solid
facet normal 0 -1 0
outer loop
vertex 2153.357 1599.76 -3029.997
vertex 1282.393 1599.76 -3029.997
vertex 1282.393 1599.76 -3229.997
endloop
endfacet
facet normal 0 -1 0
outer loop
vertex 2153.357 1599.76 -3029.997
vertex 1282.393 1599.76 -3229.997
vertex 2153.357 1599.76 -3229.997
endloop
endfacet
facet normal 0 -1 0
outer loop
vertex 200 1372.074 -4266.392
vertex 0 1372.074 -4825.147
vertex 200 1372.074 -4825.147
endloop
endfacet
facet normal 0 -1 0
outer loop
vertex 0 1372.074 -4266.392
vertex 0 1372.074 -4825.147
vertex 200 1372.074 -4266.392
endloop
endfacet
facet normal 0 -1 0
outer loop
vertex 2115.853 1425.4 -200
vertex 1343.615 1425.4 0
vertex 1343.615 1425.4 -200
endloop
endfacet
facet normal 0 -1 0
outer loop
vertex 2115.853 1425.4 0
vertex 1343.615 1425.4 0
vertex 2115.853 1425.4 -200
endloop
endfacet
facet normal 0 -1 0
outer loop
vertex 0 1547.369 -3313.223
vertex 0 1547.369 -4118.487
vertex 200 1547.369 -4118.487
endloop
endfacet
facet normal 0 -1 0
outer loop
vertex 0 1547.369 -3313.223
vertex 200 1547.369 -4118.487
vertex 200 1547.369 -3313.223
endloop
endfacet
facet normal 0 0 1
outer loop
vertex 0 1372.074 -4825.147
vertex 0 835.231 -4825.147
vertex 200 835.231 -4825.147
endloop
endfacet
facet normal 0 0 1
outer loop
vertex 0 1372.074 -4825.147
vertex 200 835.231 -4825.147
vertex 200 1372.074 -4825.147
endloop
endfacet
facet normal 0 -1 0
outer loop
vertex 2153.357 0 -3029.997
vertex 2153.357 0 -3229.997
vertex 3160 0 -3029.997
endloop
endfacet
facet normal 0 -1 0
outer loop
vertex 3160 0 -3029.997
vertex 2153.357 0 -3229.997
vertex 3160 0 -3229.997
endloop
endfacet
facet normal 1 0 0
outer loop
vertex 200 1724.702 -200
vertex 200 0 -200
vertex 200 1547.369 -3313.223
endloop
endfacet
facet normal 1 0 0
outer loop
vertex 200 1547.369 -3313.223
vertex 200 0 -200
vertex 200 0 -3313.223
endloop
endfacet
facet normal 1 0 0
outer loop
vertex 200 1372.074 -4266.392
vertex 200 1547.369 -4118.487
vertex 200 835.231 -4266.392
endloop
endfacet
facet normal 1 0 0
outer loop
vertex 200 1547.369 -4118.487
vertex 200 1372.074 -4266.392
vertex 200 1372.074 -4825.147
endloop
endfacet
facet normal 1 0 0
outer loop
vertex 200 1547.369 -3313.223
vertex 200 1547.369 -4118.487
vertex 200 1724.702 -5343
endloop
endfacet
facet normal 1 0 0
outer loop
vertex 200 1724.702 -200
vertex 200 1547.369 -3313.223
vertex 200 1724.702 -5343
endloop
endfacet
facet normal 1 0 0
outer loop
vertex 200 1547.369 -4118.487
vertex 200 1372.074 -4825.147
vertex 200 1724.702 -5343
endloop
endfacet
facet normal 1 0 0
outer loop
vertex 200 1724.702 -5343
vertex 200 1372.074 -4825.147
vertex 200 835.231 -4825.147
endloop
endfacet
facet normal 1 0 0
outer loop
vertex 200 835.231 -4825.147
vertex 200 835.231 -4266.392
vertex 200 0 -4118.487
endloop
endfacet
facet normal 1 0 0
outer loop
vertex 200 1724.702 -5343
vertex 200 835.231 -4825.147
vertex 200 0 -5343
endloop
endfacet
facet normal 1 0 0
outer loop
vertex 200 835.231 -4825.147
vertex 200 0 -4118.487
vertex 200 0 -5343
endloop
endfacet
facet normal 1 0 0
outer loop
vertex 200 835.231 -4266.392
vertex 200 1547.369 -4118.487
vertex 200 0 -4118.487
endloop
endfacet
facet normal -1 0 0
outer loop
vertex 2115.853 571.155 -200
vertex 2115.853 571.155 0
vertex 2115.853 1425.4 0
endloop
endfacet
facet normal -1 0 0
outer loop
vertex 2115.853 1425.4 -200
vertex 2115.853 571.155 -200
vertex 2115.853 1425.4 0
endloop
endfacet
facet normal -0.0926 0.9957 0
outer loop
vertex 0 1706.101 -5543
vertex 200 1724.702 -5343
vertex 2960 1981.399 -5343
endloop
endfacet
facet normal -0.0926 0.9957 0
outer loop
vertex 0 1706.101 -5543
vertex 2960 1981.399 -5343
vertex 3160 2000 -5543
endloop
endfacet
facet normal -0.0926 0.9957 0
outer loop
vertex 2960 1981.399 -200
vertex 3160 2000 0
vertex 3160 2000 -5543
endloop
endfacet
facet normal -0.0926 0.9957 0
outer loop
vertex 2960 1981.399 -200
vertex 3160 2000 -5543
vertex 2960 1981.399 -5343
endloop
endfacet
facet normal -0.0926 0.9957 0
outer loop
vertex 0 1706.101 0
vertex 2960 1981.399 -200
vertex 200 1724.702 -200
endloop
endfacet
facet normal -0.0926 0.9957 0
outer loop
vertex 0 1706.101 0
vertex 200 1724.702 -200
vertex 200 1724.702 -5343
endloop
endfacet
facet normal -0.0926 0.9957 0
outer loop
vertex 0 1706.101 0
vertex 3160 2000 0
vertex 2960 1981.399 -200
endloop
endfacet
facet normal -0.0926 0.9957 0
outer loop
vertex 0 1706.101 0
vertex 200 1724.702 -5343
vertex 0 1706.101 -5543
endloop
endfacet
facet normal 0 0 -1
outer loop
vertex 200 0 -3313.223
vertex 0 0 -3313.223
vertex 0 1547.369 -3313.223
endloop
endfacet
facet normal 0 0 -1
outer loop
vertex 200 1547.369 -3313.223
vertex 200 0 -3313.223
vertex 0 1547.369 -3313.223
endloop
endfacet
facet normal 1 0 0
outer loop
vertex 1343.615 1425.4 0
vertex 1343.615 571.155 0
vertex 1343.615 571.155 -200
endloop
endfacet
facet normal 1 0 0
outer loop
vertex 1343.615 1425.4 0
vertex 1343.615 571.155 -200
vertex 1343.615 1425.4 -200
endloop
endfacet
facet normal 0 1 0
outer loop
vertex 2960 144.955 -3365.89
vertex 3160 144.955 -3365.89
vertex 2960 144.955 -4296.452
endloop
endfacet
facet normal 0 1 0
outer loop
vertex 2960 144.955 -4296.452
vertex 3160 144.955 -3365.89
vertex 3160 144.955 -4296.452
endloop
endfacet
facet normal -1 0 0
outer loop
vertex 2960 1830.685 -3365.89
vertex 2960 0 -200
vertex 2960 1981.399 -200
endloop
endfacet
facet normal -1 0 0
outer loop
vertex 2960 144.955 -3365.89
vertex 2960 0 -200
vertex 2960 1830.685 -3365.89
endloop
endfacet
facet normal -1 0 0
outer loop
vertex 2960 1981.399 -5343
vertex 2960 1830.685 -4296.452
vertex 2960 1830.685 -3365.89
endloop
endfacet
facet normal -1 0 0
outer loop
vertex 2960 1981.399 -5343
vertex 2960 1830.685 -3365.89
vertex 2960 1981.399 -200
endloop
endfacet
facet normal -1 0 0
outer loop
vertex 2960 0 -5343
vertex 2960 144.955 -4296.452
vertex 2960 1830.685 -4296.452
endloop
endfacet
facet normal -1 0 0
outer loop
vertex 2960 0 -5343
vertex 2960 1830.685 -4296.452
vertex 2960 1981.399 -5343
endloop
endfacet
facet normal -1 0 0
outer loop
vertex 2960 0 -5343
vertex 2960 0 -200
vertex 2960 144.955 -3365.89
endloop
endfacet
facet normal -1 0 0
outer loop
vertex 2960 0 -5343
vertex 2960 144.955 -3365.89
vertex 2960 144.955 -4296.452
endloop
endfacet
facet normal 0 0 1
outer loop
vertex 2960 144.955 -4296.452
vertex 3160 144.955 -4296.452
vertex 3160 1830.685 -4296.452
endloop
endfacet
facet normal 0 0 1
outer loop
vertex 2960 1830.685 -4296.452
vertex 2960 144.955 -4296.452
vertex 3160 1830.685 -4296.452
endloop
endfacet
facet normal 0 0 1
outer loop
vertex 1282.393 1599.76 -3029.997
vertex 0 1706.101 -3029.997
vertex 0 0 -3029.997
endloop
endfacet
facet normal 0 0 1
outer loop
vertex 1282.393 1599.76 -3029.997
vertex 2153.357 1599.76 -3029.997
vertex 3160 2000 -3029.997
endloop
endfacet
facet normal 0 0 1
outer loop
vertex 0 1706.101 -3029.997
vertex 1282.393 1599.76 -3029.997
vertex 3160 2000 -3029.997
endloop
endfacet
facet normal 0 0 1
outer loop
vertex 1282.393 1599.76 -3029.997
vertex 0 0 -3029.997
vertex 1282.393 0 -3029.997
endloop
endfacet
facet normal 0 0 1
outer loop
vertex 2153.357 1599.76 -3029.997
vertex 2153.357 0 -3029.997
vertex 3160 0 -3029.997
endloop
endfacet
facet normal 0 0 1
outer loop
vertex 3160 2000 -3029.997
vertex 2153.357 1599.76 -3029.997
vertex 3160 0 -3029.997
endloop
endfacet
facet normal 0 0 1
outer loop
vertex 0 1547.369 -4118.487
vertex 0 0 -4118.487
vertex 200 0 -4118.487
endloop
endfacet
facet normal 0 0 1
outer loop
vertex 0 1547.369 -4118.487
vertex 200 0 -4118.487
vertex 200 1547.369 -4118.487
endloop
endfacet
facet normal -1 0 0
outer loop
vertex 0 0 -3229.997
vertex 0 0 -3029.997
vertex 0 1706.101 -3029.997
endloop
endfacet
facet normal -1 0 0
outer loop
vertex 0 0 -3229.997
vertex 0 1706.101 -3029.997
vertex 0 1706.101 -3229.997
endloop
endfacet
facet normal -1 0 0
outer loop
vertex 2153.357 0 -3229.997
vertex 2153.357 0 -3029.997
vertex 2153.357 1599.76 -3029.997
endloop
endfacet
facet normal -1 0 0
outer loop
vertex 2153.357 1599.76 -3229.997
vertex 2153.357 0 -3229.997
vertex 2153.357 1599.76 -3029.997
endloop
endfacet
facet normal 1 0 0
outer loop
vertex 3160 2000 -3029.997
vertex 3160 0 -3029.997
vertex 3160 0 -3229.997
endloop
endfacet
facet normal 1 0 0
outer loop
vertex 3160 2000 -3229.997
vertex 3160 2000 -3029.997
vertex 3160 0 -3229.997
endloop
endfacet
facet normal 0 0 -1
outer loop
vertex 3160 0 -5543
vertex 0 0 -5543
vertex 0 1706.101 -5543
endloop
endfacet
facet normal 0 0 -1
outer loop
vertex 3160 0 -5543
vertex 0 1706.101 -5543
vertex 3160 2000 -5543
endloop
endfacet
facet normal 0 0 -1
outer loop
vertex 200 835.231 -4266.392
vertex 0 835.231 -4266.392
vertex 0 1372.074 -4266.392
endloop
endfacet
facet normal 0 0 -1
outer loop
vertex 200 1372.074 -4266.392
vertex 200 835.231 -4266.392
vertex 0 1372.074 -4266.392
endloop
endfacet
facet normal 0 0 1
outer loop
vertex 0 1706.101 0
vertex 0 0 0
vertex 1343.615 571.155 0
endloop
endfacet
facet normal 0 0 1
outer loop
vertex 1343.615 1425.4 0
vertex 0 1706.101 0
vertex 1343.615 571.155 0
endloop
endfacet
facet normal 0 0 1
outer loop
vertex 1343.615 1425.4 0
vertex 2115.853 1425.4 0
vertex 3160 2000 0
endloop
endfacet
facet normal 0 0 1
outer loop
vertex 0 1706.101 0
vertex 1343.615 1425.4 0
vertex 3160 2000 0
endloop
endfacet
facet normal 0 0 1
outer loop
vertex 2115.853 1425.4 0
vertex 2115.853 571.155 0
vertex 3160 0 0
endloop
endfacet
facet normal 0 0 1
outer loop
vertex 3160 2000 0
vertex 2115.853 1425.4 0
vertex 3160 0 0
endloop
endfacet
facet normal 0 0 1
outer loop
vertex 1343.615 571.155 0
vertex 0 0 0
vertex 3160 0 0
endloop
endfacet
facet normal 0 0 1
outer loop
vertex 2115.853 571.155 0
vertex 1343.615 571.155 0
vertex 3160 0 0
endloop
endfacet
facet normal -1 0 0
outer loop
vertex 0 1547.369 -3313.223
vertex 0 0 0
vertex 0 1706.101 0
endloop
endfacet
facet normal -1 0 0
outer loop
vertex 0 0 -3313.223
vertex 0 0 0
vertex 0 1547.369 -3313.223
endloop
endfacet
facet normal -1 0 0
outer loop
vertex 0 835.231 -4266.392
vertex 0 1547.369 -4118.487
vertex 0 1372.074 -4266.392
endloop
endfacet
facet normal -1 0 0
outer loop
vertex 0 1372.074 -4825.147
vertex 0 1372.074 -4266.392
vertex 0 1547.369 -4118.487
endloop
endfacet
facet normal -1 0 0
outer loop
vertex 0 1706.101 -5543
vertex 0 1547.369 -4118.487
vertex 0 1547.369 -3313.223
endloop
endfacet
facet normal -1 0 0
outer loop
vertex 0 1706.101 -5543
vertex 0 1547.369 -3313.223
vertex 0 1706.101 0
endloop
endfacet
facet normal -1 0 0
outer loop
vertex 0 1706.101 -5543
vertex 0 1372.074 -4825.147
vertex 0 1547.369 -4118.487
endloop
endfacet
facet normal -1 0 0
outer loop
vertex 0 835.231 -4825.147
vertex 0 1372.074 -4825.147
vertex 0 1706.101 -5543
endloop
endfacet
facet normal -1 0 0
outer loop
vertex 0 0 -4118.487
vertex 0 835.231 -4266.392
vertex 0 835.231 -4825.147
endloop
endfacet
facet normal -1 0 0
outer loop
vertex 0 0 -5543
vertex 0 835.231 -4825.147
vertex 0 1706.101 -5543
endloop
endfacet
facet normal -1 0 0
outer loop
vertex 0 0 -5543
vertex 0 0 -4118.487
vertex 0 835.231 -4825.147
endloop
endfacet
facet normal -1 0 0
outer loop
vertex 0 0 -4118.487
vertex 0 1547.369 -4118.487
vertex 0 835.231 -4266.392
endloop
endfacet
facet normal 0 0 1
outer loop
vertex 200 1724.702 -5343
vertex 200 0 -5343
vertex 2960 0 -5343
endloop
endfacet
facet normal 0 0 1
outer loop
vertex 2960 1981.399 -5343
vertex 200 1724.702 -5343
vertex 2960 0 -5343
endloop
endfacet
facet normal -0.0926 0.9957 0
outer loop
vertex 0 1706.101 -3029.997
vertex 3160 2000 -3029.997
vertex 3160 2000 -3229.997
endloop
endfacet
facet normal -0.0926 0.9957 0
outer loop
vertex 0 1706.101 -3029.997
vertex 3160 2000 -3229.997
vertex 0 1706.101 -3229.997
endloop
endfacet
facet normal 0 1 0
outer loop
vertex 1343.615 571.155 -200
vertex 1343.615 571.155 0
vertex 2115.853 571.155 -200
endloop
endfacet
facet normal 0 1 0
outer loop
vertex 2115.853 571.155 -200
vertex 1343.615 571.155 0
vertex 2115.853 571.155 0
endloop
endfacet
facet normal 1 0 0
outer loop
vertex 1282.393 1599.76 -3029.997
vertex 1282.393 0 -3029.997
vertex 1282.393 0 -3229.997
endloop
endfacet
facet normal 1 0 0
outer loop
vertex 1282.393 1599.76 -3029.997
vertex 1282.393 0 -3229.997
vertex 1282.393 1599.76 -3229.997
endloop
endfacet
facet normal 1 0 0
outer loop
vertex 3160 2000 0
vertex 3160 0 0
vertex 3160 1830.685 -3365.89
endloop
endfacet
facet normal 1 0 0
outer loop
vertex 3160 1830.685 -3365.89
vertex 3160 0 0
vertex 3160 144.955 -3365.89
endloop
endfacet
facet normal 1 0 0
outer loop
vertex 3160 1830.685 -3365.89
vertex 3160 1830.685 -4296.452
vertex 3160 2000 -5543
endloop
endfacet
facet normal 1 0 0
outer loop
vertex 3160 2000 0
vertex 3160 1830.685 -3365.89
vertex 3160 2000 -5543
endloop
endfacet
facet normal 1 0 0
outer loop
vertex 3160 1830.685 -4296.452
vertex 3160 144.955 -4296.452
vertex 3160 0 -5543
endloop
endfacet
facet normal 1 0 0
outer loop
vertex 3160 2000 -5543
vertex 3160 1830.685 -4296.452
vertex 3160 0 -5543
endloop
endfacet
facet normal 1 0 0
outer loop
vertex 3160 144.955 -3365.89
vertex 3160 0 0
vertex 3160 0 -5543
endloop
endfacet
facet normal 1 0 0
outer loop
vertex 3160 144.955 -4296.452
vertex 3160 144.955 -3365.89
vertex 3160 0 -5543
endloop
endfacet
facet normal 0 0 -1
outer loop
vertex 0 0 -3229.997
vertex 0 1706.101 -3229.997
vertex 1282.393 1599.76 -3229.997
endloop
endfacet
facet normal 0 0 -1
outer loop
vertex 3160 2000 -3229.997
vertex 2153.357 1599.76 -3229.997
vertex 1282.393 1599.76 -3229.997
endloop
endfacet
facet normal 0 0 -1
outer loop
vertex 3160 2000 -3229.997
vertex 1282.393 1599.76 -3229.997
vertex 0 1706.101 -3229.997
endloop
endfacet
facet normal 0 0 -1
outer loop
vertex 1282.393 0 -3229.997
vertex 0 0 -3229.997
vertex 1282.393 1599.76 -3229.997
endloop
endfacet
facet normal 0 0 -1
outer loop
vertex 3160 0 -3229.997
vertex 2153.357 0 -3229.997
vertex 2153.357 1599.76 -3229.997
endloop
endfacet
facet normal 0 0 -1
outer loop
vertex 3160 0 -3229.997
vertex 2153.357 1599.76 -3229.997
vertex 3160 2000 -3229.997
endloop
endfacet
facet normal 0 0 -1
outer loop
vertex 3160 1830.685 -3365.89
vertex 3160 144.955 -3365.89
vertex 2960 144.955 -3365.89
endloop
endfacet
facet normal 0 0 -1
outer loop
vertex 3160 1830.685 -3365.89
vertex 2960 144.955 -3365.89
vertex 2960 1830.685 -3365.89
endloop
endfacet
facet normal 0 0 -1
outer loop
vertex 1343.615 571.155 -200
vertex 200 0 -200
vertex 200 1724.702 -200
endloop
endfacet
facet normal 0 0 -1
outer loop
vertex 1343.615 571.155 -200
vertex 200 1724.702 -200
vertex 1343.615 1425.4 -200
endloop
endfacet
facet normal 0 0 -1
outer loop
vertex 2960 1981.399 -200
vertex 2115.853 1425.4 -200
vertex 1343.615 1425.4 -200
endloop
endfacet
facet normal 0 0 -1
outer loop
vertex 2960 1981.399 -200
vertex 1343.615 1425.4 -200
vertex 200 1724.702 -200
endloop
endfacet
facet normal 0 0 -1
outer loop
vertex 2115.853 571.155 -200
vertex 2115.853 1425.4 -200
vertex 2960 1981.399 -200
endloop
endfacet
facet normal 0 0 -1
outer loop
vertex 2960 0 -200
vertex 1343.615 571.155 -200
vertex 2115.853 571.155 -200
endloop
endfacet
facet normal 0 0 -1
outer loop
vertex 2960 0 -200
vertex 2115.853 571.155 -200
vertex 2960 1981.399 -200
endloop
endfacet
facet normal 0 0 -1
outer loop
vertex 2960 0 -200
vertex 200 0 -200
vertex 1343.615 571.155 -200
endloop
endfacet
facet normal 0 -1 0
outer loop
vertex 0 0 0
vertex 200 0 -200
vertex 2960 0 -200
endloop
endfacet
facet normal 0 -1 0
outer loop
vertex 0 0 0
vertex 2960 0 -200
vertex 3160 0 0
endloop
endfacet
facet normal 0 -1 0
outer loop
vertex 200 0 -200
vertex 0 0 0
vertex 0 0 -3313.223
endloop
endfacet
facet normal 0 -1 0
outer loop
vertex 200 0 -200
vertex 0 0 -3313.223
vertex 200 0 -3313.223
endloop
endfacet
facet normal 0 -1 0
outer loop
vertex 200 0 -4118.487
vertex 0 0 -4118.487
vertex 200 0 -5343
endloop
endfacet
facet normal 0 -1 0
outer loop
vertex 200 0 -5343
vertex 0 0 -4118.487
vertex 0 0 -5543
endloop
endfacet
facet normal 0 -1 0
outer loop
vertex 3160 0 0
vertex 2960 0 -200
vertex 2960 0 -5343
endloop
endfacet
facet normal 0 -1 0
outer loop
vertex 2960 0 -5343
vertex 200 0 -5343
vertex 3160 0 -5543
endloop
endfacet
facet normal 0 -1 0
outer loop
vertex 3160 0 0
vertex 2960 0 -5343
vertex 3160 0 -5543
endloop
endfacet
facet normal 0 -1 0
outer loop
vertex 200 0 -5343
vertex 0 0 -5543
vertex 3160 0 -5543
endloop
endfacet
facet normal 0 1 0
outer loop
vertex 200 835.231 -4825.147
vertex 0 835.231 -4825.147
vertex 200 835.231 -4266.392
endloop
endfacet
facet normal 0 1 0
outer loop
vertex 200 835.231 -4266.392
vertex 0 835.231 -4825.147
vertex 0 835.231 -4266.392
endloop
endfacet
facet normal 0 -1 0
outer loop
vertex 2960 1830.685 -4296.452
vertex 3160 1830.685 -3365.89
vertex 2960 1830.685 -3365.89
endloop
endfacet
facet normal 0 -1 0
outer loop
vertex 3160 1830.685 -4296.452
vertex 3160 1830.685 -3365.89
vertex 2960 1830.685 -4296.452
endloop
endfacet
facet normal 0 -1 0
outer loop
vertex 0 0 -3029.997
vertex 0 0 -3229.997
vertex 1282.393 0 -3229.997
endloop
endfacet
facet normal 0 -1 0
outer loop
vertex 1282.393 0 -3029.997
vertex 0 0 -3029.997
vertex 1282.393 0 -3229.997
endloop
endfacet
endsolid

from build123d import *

# Parameters (mm, degrees)
EXTRUDE_1_OUTLINE_W   = 3160
EXTRUDE_1_OUTLINE_H   = 5543
EXTRUDE_1_OUTLINE_W_2 = 2760
EXTRUDE_1_OUTLINE_H_2 = 5143
EXTRUDE_1_DEPTH       = 2000
EXTRUDE_1_2_OUTLINE_W = 3160
EXTRUDE_1_2_OUTLINE_H = 200
EXTRUDE_1_2_DEPTH     = 2000
CUT_EXTRUDE_1_DEPTH   = 6687.587246122
SKETCH_3_W            = 558.75449328
SKETCH_3_H            = 536.842552368
SKETCH_3_W_2          = 805.263828551
SKETCH_3_H_2          = 1547.369391924
CUT_EXTRUDE_2_DEPTH   = 200
SKETCH_4_W            = 772.237717919
SKETCH_4_H            = 854.245263185
CUT_EXTRUDE_3_DEPTH   = 200
SKETCH_5_W            = 870.964551477
SKETCH_5_H            = 1599.759628709
CUT_EXTRUDE_4_DEPTH   = 200
SKETCH_6_W            = 930.561753535
SKETCH_6_H            = 1685.729668706
CUT_EXTRUDE_5_DEPTH   = 200


# Read off the part's stored shape, not the designer's step: Вытянуть-Тонкостенный1
with BuildPart() as part:
    # Вытянуть-Тонкостенный1 outline → Вытянуть-Тонкостенный1 (new body)
    with BuildSketch(Plane(origin=(0, 0, 0), x_dir=(1, 0, 0), z_dir=(0, 1, 0))):
        with Locations((1580, 2771.5)):
            Rectangle(EXTRUDE_1_OUTLINE_W, EXTRUDE_1_OUTLINE_H)
        with Locations((1580, 2771.5)):
            Rectangle(EXTRUDE_1_OUTLINE_W_2, EXTRUDE_1_OUTLINE_H_2, mode=Mode.SUBTRACT)
    extrude(amount=EXTRUDE_1_DEPTH)


with BuildPart() as body_2:
    # Extrude 1 2 outline → Extrude 1 2 (new body)
    with BuildSketch(Plane(origin=(0, 0, 0), x_dir=(1, 0, 0), z_dir=(0, 1, 0))):
        with Locations((1580, 3129.997484617)):
            Rectangle(EXTRUDE_1_2_OUTLINE_W, EXTRUDE_1_2_OUTLINE_H)
    extrude(amount=EXTRUDE_1_2_DEPTH)


with BuildPart() as cut_extrude_1_tool:
    # Эскиз2 → Вырез-Вытянуть1 (new, through all)
    with BuildSketch(Plane.XY):
        Polygon((0, 2000), (3160, 2000), (0, 1706.10063383), align=None)
    extrude(amount=-CUT_EXTRUDE_1_DEPTH)


with BuildPart() as part_1:
    add(part.part)

    # Вырез-Вытянуть1: cut by cut_extrude_1_tool
    add(cut_extrude_1_tool.part, mode=Mode.SUBTRACT)

    # Эскиз3 → Вырез-Вытянуть2 (cut)
    with BuildSketch(Plane.ZY):
        with Locations((-4545.769607678, 1103.652588436)):
            Rectangle(SKETCH_3_W, SKETCH_3_H)
        with Locations((-3715.8548456, 773.684695962)):
            Rectangle(SKETCH_3_W_2, SKETCH_3_H_2)
    extrude(amount=-CUT_EXTRUDE_2_DEPTH, mode=Mode.SUBTRACT)

    # Эскиз4 → Вырез-Вытянуть3 (cut)
    with BuildSketch(Plane.XY):
        with Locations((1729.734220459, 998.277334586)):
            Rectangle(SKETCH_4_W, SKETCH_4_H)
    extrude(amount=-CUT_EXTRUDE_3_DEPTH, mode=Mode.SUBTRACT)

    # Эскиз6 → Вырез-Вытянуть5 (cut)
    with BuildSketch(Plane(origin=(3160, 0, 0), x_dir=(0, 0, -1), z_dir=(1, 0, 0))):
        with Locations((3831.171106774, 987.819872336)):
            Rectangle(SKETCH_6_W, SKETCH_6_H)
    extrude(amount=-CUT_EXTRUDE_5_DEPTH, mode=Mode.SUBTRACT)


with BuildPart() as body_2_1:
    add(body_2.part)

    # Вырез-Вытянуть1: cut by cut_extrude_1_tool
    add(cut_extrude_1_tool.part, mode=Mode.SUBTRACT)

    # Эскиз5 → Вырез-Вытянуть4 (cut)
    with BuildSketch(Plane.XY.offset(-3029.997484617)):
        with Locations((1717.874921169, 799.879814355)):
            Rectangle(SKETCH_5_W, SKETCH_5_H)
    extrude(amount=-CUT_EXTRUDE_4_DEPTH, mode=Mode.SUBTRACT)


solid = Compound([part_1.part, body_2_1.part])
